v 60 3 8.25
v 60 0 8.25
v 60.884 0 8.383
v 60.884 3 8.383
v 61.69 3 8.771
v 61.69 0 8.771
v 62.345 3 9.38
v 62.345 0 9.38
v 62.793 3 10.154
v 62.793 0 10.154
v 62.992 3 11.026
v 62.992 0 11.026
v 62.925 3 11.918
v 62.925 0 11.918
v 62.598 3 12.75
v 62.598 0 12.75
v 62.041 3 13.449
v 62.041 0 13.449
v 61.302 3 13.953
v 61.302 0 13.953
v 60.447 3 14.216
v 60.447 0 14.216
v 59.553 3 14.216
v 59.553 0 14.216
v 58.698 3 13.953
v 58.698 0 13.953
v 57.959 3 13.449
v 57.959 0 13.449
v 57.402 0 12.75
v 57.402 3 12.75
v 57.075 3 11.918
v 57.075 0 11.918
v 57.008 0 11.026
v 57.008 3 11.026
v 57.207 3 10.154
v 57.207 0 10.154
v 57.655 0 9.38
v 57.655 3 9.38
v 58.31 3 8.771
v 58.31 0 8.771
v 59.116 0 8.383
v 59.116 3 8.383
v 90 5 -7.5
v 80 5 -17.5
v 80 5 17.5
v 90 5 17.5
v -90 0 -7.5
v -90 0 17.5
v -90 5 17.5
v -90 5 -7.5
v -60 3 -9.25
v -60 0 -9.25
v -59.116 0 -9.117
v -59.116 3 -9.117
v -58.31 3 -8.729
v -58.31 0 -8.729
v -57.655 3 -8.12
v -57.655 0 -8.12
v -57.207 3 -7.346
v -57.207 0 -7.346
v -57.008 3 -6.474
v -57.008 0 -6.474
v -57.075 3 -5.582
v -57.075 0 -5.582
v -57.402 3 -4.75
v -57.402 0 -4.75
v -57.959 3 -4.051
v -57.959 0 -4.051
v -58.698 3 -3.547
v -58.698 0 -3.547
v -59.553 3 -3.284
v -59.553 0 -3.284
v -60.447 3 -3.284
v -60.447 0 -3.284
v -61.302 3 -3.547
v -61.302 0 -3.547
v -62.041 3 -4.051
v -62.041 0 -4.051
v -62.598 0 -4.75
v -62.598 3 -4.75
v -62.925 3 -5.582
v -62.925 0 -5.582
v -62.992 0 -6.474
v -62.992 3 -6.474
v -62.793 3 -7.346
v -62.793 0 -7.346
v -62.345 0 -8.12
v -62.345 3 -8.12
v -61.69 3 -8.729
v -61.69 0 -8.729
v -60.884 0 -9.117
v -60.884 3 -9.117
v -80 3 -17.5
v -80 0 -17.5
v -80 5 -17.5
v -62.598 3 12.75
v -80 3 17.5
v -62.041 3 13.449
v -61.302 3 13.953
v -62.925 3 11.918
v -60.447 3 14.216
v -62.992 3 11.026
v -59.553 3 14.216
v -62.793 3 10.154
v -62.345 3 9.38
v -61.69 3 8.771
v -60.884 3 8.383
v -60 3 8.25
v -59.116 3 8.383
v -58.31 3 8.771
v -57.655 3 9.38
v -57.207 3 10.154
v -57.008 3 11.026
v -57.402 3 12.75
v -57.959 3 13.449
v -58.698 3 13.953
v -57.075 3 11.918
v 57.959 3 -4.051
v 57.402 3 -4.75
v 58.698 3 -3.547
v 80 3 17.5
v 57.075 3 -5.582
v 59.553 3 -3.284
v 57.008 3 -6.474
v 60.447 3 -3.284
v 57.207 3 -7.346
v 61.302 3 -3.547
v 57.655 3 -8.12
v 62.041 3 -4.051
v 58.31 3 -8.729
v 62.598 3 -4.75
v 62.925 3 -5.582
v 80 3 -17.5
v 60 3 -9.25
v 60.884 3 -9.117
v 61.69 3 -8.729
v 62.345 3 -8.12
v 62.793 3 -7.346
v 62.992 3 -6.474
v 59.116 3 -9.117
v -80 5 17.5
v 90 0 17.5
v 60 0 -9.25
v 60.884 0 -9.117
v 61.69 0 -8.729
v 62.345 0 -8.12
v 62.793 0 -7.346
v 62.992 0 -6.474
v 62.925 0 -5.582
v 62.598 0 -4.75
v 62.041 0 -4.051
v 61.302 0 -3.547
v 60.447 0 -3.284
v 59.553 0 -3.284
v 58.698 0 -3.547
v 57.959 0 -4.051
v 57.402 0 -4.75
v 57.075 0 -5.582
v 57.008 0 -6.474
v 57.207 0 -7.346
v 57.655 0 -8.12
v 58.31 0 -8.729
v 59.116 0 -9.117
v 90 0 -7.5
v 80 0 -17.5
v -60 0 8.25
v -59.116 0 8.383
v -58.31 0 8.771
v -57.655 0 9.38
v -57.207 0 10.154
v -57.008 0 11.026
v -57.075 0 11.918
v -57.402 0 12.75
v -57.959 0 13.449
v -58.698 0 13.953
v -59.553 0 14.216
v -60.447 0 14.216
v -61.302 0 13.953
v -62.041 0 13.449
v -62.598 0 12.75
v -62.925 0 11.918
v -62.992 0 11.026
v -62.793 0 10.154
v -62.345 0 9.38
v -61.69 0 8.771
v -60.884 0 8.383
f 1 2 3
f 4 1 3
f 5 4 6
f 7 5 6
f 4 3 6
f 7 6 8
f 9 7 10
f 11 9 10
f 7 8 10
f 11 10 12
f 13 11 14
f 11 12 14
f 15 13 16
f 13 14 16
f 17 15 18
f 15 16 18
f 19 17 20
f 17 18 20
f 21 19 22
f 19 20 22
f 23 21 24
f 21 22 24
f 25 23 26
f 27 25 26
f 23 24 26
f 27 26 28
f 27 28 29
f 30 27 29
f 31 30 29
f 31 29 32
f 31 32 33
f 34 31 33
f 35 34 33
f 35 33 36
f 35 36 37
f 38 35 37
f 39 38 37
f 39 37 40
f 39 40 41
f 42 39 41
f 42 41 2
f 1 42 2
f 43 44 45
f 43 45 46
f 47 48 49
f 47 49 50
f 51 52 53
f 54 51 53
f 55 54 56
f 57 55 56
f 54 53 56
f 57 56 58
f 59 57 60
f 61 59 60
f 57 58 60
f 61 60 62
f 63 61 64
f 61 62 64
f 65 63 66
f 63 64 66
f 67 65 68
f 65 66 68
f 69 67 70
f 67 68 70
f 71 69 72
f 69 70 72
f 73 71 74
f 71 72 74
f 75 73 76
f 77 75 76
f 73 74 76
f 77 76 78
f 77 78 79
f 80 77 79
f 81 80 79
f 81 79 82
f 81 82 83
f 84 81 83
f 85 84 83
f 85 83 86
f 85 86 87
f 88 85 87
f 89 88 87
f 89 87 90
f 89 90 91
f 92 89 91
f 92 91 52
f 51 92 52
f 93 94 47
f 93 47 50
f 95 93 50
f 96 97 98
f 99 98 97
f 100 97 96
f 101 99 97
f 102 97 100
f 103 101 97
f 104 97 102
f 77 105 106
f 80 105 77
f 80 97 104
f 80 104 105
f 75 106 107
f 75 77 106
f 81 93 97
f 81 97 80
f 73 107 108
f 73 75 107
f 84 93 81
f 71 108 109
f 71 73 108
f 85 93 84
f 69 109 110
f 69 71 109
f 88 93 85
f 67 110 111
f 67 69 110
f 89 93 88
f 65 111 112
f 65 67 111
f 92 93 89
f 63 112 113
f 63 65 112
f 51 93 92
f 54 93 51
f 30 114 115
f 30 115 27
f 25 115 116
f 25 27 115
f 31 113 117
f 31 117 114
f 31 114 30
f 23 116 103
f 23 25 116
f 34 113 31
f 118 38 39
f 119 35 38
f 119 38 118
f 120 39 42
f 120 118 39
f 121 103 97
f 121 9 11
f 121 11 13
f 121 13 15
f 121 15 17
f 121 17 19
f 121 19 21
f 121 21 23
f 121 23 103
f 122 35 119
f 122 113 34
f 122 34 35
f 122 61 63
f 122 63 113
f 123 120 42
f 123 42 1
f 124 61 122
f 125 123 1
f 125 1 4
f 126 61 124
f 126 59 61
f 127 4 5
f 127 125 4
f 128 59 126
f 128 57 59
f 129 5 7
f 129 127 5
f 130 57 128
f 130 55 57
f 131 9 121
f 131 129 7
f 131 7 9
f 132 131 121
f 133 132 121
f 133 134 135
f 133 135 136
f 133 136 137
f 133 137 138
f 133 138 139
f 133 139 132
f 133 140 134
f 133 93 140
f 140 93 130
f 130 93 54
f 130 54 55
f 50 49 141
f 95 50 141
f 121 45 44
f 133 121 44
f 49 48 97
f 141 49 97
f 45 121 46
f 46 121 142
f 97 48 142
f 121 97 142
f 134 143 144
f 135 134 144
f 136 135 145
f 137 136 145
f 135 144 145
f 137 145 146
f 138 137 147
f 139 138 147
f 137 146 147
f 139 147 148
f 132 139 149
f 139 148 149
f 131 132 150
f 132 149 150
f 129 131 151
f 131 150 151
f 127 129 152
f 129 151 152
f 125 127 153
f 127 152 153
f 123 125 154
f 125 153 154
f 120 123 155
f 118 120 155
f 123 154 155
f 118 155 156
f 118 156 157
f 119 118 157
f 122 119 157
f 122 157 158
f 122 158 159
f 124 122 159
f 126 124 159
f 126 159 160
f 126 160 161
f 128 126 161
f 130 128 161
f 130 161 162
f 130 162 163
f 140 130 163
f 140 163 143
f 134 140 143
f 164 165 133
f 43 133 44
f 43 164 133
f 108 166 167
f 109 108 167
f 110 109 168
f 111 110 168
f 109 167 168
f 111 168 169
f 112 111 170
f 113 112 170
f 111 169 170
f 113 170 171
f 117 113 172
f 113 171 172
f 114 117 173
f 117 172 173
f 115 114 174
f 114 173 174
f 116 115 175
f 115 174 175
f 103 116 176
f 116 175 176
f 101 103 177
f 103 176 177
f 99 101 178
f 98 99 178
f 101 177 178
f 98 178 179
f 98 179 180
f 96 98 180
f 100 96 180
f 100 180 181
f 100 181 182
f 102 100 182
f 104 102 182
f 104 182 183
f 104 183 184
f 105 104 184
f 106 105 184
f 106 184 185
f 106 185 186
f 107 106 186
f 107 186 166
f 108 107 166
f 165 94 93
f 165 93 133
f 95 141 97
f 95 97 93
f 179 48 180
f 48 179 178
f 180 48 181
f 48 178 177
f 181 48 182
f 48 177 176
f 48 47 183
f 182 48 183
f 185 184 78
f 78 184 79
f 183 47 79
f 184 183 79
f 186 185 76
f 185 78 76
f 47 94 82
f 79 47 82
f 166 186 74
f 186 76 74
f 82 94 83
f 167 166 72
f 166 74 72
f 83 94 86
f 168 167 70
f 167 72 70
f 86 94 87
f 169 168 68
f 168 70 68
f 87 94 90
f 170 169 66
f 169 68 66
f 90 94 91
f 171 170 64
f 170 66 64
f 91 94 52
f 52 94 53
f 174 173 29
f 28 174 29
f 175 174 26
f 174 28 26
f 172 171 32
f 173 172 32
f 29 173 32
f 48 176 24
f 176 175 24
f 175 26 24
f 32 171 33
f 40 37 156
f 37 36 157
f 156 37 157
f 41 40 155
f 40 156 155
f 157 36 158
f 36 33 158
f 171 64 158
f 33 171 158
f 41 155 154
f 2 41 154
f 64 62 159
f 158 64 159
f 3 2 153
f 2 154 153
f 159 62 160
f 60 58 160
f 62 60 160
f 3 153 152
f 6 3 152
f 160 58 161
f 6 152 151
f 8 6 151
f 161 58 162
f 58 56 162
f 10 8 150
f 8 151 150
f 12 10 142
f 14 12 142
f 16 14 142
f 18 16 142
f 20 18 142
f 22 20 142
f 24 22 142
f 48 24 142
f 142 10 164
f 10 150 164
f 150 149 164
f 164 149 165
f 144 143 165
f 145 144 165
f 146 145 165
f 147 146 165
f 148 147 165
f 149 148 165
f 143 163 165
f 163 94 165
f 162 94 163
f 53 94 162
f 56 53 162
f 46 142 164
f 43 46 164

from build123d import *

# Parameters (mm, degrees)
SKETCH1_W             = 180
SKETCH1_H             = 35
BOSS_EXTRUDE1_DEPTH   = 5
F_6_0MM_DOWEL_HOLE1_D = 6
SKETCH4_W             = 160
SKETCH4_H             = 35
CUT_EXTRUDE1_DEPTH    = 2
CHAMFER1_SIZE         = 10


with BuildPart() as part:
    # Sketch1 → Boss-Extrude1 (new body)
    with BuildSketch(Plane(origin=(0, 0, 0), x_dir=(1, 0, 0), z_dir=(0, 1, 0))):
        Rectangle(SKETCH1_W, SKETCH1_H)
    extrude(amount=BOSS_EXTRUDE1_DEPTH)

    # Ø6.0mm Dowel Hole1 (through all)
    with Locations(Plane(origin=(-60, 5, -6.25), x_dir=(0, 0, 1), z_dir=(0, 1, 0))):
        with Locations((0, 0), (17.5, 0), (0, 120), (17.5, 120)):
            Hole(F_6_0MM_DOWEL_HOLE1_D / 2)

    # Sketch4 → Cut-Extrude1 (cut)
    with BuildSketch(Plane(origin=(0, 5, 0), x_dir=(1, 0, 0), z_dir=(0, 1, 0))):
        Rectangle(SKETCH4_W, SKETCH4_H)
    extrude(amount=-CUT_EXTRUDE1_DEPTH, mode=Mode.SUBTRACT)

    # Chamfer1
    chamfer1_edges = [part.edges().sort_by_distance(p)[0] for p in [
        (90, 2.5, -17.5),
        (-90, 2.5, -17.5),
    ]]
    chamfer(chamfer1_edges, length=CHAMFER1_SIZE)


solid = part.part
